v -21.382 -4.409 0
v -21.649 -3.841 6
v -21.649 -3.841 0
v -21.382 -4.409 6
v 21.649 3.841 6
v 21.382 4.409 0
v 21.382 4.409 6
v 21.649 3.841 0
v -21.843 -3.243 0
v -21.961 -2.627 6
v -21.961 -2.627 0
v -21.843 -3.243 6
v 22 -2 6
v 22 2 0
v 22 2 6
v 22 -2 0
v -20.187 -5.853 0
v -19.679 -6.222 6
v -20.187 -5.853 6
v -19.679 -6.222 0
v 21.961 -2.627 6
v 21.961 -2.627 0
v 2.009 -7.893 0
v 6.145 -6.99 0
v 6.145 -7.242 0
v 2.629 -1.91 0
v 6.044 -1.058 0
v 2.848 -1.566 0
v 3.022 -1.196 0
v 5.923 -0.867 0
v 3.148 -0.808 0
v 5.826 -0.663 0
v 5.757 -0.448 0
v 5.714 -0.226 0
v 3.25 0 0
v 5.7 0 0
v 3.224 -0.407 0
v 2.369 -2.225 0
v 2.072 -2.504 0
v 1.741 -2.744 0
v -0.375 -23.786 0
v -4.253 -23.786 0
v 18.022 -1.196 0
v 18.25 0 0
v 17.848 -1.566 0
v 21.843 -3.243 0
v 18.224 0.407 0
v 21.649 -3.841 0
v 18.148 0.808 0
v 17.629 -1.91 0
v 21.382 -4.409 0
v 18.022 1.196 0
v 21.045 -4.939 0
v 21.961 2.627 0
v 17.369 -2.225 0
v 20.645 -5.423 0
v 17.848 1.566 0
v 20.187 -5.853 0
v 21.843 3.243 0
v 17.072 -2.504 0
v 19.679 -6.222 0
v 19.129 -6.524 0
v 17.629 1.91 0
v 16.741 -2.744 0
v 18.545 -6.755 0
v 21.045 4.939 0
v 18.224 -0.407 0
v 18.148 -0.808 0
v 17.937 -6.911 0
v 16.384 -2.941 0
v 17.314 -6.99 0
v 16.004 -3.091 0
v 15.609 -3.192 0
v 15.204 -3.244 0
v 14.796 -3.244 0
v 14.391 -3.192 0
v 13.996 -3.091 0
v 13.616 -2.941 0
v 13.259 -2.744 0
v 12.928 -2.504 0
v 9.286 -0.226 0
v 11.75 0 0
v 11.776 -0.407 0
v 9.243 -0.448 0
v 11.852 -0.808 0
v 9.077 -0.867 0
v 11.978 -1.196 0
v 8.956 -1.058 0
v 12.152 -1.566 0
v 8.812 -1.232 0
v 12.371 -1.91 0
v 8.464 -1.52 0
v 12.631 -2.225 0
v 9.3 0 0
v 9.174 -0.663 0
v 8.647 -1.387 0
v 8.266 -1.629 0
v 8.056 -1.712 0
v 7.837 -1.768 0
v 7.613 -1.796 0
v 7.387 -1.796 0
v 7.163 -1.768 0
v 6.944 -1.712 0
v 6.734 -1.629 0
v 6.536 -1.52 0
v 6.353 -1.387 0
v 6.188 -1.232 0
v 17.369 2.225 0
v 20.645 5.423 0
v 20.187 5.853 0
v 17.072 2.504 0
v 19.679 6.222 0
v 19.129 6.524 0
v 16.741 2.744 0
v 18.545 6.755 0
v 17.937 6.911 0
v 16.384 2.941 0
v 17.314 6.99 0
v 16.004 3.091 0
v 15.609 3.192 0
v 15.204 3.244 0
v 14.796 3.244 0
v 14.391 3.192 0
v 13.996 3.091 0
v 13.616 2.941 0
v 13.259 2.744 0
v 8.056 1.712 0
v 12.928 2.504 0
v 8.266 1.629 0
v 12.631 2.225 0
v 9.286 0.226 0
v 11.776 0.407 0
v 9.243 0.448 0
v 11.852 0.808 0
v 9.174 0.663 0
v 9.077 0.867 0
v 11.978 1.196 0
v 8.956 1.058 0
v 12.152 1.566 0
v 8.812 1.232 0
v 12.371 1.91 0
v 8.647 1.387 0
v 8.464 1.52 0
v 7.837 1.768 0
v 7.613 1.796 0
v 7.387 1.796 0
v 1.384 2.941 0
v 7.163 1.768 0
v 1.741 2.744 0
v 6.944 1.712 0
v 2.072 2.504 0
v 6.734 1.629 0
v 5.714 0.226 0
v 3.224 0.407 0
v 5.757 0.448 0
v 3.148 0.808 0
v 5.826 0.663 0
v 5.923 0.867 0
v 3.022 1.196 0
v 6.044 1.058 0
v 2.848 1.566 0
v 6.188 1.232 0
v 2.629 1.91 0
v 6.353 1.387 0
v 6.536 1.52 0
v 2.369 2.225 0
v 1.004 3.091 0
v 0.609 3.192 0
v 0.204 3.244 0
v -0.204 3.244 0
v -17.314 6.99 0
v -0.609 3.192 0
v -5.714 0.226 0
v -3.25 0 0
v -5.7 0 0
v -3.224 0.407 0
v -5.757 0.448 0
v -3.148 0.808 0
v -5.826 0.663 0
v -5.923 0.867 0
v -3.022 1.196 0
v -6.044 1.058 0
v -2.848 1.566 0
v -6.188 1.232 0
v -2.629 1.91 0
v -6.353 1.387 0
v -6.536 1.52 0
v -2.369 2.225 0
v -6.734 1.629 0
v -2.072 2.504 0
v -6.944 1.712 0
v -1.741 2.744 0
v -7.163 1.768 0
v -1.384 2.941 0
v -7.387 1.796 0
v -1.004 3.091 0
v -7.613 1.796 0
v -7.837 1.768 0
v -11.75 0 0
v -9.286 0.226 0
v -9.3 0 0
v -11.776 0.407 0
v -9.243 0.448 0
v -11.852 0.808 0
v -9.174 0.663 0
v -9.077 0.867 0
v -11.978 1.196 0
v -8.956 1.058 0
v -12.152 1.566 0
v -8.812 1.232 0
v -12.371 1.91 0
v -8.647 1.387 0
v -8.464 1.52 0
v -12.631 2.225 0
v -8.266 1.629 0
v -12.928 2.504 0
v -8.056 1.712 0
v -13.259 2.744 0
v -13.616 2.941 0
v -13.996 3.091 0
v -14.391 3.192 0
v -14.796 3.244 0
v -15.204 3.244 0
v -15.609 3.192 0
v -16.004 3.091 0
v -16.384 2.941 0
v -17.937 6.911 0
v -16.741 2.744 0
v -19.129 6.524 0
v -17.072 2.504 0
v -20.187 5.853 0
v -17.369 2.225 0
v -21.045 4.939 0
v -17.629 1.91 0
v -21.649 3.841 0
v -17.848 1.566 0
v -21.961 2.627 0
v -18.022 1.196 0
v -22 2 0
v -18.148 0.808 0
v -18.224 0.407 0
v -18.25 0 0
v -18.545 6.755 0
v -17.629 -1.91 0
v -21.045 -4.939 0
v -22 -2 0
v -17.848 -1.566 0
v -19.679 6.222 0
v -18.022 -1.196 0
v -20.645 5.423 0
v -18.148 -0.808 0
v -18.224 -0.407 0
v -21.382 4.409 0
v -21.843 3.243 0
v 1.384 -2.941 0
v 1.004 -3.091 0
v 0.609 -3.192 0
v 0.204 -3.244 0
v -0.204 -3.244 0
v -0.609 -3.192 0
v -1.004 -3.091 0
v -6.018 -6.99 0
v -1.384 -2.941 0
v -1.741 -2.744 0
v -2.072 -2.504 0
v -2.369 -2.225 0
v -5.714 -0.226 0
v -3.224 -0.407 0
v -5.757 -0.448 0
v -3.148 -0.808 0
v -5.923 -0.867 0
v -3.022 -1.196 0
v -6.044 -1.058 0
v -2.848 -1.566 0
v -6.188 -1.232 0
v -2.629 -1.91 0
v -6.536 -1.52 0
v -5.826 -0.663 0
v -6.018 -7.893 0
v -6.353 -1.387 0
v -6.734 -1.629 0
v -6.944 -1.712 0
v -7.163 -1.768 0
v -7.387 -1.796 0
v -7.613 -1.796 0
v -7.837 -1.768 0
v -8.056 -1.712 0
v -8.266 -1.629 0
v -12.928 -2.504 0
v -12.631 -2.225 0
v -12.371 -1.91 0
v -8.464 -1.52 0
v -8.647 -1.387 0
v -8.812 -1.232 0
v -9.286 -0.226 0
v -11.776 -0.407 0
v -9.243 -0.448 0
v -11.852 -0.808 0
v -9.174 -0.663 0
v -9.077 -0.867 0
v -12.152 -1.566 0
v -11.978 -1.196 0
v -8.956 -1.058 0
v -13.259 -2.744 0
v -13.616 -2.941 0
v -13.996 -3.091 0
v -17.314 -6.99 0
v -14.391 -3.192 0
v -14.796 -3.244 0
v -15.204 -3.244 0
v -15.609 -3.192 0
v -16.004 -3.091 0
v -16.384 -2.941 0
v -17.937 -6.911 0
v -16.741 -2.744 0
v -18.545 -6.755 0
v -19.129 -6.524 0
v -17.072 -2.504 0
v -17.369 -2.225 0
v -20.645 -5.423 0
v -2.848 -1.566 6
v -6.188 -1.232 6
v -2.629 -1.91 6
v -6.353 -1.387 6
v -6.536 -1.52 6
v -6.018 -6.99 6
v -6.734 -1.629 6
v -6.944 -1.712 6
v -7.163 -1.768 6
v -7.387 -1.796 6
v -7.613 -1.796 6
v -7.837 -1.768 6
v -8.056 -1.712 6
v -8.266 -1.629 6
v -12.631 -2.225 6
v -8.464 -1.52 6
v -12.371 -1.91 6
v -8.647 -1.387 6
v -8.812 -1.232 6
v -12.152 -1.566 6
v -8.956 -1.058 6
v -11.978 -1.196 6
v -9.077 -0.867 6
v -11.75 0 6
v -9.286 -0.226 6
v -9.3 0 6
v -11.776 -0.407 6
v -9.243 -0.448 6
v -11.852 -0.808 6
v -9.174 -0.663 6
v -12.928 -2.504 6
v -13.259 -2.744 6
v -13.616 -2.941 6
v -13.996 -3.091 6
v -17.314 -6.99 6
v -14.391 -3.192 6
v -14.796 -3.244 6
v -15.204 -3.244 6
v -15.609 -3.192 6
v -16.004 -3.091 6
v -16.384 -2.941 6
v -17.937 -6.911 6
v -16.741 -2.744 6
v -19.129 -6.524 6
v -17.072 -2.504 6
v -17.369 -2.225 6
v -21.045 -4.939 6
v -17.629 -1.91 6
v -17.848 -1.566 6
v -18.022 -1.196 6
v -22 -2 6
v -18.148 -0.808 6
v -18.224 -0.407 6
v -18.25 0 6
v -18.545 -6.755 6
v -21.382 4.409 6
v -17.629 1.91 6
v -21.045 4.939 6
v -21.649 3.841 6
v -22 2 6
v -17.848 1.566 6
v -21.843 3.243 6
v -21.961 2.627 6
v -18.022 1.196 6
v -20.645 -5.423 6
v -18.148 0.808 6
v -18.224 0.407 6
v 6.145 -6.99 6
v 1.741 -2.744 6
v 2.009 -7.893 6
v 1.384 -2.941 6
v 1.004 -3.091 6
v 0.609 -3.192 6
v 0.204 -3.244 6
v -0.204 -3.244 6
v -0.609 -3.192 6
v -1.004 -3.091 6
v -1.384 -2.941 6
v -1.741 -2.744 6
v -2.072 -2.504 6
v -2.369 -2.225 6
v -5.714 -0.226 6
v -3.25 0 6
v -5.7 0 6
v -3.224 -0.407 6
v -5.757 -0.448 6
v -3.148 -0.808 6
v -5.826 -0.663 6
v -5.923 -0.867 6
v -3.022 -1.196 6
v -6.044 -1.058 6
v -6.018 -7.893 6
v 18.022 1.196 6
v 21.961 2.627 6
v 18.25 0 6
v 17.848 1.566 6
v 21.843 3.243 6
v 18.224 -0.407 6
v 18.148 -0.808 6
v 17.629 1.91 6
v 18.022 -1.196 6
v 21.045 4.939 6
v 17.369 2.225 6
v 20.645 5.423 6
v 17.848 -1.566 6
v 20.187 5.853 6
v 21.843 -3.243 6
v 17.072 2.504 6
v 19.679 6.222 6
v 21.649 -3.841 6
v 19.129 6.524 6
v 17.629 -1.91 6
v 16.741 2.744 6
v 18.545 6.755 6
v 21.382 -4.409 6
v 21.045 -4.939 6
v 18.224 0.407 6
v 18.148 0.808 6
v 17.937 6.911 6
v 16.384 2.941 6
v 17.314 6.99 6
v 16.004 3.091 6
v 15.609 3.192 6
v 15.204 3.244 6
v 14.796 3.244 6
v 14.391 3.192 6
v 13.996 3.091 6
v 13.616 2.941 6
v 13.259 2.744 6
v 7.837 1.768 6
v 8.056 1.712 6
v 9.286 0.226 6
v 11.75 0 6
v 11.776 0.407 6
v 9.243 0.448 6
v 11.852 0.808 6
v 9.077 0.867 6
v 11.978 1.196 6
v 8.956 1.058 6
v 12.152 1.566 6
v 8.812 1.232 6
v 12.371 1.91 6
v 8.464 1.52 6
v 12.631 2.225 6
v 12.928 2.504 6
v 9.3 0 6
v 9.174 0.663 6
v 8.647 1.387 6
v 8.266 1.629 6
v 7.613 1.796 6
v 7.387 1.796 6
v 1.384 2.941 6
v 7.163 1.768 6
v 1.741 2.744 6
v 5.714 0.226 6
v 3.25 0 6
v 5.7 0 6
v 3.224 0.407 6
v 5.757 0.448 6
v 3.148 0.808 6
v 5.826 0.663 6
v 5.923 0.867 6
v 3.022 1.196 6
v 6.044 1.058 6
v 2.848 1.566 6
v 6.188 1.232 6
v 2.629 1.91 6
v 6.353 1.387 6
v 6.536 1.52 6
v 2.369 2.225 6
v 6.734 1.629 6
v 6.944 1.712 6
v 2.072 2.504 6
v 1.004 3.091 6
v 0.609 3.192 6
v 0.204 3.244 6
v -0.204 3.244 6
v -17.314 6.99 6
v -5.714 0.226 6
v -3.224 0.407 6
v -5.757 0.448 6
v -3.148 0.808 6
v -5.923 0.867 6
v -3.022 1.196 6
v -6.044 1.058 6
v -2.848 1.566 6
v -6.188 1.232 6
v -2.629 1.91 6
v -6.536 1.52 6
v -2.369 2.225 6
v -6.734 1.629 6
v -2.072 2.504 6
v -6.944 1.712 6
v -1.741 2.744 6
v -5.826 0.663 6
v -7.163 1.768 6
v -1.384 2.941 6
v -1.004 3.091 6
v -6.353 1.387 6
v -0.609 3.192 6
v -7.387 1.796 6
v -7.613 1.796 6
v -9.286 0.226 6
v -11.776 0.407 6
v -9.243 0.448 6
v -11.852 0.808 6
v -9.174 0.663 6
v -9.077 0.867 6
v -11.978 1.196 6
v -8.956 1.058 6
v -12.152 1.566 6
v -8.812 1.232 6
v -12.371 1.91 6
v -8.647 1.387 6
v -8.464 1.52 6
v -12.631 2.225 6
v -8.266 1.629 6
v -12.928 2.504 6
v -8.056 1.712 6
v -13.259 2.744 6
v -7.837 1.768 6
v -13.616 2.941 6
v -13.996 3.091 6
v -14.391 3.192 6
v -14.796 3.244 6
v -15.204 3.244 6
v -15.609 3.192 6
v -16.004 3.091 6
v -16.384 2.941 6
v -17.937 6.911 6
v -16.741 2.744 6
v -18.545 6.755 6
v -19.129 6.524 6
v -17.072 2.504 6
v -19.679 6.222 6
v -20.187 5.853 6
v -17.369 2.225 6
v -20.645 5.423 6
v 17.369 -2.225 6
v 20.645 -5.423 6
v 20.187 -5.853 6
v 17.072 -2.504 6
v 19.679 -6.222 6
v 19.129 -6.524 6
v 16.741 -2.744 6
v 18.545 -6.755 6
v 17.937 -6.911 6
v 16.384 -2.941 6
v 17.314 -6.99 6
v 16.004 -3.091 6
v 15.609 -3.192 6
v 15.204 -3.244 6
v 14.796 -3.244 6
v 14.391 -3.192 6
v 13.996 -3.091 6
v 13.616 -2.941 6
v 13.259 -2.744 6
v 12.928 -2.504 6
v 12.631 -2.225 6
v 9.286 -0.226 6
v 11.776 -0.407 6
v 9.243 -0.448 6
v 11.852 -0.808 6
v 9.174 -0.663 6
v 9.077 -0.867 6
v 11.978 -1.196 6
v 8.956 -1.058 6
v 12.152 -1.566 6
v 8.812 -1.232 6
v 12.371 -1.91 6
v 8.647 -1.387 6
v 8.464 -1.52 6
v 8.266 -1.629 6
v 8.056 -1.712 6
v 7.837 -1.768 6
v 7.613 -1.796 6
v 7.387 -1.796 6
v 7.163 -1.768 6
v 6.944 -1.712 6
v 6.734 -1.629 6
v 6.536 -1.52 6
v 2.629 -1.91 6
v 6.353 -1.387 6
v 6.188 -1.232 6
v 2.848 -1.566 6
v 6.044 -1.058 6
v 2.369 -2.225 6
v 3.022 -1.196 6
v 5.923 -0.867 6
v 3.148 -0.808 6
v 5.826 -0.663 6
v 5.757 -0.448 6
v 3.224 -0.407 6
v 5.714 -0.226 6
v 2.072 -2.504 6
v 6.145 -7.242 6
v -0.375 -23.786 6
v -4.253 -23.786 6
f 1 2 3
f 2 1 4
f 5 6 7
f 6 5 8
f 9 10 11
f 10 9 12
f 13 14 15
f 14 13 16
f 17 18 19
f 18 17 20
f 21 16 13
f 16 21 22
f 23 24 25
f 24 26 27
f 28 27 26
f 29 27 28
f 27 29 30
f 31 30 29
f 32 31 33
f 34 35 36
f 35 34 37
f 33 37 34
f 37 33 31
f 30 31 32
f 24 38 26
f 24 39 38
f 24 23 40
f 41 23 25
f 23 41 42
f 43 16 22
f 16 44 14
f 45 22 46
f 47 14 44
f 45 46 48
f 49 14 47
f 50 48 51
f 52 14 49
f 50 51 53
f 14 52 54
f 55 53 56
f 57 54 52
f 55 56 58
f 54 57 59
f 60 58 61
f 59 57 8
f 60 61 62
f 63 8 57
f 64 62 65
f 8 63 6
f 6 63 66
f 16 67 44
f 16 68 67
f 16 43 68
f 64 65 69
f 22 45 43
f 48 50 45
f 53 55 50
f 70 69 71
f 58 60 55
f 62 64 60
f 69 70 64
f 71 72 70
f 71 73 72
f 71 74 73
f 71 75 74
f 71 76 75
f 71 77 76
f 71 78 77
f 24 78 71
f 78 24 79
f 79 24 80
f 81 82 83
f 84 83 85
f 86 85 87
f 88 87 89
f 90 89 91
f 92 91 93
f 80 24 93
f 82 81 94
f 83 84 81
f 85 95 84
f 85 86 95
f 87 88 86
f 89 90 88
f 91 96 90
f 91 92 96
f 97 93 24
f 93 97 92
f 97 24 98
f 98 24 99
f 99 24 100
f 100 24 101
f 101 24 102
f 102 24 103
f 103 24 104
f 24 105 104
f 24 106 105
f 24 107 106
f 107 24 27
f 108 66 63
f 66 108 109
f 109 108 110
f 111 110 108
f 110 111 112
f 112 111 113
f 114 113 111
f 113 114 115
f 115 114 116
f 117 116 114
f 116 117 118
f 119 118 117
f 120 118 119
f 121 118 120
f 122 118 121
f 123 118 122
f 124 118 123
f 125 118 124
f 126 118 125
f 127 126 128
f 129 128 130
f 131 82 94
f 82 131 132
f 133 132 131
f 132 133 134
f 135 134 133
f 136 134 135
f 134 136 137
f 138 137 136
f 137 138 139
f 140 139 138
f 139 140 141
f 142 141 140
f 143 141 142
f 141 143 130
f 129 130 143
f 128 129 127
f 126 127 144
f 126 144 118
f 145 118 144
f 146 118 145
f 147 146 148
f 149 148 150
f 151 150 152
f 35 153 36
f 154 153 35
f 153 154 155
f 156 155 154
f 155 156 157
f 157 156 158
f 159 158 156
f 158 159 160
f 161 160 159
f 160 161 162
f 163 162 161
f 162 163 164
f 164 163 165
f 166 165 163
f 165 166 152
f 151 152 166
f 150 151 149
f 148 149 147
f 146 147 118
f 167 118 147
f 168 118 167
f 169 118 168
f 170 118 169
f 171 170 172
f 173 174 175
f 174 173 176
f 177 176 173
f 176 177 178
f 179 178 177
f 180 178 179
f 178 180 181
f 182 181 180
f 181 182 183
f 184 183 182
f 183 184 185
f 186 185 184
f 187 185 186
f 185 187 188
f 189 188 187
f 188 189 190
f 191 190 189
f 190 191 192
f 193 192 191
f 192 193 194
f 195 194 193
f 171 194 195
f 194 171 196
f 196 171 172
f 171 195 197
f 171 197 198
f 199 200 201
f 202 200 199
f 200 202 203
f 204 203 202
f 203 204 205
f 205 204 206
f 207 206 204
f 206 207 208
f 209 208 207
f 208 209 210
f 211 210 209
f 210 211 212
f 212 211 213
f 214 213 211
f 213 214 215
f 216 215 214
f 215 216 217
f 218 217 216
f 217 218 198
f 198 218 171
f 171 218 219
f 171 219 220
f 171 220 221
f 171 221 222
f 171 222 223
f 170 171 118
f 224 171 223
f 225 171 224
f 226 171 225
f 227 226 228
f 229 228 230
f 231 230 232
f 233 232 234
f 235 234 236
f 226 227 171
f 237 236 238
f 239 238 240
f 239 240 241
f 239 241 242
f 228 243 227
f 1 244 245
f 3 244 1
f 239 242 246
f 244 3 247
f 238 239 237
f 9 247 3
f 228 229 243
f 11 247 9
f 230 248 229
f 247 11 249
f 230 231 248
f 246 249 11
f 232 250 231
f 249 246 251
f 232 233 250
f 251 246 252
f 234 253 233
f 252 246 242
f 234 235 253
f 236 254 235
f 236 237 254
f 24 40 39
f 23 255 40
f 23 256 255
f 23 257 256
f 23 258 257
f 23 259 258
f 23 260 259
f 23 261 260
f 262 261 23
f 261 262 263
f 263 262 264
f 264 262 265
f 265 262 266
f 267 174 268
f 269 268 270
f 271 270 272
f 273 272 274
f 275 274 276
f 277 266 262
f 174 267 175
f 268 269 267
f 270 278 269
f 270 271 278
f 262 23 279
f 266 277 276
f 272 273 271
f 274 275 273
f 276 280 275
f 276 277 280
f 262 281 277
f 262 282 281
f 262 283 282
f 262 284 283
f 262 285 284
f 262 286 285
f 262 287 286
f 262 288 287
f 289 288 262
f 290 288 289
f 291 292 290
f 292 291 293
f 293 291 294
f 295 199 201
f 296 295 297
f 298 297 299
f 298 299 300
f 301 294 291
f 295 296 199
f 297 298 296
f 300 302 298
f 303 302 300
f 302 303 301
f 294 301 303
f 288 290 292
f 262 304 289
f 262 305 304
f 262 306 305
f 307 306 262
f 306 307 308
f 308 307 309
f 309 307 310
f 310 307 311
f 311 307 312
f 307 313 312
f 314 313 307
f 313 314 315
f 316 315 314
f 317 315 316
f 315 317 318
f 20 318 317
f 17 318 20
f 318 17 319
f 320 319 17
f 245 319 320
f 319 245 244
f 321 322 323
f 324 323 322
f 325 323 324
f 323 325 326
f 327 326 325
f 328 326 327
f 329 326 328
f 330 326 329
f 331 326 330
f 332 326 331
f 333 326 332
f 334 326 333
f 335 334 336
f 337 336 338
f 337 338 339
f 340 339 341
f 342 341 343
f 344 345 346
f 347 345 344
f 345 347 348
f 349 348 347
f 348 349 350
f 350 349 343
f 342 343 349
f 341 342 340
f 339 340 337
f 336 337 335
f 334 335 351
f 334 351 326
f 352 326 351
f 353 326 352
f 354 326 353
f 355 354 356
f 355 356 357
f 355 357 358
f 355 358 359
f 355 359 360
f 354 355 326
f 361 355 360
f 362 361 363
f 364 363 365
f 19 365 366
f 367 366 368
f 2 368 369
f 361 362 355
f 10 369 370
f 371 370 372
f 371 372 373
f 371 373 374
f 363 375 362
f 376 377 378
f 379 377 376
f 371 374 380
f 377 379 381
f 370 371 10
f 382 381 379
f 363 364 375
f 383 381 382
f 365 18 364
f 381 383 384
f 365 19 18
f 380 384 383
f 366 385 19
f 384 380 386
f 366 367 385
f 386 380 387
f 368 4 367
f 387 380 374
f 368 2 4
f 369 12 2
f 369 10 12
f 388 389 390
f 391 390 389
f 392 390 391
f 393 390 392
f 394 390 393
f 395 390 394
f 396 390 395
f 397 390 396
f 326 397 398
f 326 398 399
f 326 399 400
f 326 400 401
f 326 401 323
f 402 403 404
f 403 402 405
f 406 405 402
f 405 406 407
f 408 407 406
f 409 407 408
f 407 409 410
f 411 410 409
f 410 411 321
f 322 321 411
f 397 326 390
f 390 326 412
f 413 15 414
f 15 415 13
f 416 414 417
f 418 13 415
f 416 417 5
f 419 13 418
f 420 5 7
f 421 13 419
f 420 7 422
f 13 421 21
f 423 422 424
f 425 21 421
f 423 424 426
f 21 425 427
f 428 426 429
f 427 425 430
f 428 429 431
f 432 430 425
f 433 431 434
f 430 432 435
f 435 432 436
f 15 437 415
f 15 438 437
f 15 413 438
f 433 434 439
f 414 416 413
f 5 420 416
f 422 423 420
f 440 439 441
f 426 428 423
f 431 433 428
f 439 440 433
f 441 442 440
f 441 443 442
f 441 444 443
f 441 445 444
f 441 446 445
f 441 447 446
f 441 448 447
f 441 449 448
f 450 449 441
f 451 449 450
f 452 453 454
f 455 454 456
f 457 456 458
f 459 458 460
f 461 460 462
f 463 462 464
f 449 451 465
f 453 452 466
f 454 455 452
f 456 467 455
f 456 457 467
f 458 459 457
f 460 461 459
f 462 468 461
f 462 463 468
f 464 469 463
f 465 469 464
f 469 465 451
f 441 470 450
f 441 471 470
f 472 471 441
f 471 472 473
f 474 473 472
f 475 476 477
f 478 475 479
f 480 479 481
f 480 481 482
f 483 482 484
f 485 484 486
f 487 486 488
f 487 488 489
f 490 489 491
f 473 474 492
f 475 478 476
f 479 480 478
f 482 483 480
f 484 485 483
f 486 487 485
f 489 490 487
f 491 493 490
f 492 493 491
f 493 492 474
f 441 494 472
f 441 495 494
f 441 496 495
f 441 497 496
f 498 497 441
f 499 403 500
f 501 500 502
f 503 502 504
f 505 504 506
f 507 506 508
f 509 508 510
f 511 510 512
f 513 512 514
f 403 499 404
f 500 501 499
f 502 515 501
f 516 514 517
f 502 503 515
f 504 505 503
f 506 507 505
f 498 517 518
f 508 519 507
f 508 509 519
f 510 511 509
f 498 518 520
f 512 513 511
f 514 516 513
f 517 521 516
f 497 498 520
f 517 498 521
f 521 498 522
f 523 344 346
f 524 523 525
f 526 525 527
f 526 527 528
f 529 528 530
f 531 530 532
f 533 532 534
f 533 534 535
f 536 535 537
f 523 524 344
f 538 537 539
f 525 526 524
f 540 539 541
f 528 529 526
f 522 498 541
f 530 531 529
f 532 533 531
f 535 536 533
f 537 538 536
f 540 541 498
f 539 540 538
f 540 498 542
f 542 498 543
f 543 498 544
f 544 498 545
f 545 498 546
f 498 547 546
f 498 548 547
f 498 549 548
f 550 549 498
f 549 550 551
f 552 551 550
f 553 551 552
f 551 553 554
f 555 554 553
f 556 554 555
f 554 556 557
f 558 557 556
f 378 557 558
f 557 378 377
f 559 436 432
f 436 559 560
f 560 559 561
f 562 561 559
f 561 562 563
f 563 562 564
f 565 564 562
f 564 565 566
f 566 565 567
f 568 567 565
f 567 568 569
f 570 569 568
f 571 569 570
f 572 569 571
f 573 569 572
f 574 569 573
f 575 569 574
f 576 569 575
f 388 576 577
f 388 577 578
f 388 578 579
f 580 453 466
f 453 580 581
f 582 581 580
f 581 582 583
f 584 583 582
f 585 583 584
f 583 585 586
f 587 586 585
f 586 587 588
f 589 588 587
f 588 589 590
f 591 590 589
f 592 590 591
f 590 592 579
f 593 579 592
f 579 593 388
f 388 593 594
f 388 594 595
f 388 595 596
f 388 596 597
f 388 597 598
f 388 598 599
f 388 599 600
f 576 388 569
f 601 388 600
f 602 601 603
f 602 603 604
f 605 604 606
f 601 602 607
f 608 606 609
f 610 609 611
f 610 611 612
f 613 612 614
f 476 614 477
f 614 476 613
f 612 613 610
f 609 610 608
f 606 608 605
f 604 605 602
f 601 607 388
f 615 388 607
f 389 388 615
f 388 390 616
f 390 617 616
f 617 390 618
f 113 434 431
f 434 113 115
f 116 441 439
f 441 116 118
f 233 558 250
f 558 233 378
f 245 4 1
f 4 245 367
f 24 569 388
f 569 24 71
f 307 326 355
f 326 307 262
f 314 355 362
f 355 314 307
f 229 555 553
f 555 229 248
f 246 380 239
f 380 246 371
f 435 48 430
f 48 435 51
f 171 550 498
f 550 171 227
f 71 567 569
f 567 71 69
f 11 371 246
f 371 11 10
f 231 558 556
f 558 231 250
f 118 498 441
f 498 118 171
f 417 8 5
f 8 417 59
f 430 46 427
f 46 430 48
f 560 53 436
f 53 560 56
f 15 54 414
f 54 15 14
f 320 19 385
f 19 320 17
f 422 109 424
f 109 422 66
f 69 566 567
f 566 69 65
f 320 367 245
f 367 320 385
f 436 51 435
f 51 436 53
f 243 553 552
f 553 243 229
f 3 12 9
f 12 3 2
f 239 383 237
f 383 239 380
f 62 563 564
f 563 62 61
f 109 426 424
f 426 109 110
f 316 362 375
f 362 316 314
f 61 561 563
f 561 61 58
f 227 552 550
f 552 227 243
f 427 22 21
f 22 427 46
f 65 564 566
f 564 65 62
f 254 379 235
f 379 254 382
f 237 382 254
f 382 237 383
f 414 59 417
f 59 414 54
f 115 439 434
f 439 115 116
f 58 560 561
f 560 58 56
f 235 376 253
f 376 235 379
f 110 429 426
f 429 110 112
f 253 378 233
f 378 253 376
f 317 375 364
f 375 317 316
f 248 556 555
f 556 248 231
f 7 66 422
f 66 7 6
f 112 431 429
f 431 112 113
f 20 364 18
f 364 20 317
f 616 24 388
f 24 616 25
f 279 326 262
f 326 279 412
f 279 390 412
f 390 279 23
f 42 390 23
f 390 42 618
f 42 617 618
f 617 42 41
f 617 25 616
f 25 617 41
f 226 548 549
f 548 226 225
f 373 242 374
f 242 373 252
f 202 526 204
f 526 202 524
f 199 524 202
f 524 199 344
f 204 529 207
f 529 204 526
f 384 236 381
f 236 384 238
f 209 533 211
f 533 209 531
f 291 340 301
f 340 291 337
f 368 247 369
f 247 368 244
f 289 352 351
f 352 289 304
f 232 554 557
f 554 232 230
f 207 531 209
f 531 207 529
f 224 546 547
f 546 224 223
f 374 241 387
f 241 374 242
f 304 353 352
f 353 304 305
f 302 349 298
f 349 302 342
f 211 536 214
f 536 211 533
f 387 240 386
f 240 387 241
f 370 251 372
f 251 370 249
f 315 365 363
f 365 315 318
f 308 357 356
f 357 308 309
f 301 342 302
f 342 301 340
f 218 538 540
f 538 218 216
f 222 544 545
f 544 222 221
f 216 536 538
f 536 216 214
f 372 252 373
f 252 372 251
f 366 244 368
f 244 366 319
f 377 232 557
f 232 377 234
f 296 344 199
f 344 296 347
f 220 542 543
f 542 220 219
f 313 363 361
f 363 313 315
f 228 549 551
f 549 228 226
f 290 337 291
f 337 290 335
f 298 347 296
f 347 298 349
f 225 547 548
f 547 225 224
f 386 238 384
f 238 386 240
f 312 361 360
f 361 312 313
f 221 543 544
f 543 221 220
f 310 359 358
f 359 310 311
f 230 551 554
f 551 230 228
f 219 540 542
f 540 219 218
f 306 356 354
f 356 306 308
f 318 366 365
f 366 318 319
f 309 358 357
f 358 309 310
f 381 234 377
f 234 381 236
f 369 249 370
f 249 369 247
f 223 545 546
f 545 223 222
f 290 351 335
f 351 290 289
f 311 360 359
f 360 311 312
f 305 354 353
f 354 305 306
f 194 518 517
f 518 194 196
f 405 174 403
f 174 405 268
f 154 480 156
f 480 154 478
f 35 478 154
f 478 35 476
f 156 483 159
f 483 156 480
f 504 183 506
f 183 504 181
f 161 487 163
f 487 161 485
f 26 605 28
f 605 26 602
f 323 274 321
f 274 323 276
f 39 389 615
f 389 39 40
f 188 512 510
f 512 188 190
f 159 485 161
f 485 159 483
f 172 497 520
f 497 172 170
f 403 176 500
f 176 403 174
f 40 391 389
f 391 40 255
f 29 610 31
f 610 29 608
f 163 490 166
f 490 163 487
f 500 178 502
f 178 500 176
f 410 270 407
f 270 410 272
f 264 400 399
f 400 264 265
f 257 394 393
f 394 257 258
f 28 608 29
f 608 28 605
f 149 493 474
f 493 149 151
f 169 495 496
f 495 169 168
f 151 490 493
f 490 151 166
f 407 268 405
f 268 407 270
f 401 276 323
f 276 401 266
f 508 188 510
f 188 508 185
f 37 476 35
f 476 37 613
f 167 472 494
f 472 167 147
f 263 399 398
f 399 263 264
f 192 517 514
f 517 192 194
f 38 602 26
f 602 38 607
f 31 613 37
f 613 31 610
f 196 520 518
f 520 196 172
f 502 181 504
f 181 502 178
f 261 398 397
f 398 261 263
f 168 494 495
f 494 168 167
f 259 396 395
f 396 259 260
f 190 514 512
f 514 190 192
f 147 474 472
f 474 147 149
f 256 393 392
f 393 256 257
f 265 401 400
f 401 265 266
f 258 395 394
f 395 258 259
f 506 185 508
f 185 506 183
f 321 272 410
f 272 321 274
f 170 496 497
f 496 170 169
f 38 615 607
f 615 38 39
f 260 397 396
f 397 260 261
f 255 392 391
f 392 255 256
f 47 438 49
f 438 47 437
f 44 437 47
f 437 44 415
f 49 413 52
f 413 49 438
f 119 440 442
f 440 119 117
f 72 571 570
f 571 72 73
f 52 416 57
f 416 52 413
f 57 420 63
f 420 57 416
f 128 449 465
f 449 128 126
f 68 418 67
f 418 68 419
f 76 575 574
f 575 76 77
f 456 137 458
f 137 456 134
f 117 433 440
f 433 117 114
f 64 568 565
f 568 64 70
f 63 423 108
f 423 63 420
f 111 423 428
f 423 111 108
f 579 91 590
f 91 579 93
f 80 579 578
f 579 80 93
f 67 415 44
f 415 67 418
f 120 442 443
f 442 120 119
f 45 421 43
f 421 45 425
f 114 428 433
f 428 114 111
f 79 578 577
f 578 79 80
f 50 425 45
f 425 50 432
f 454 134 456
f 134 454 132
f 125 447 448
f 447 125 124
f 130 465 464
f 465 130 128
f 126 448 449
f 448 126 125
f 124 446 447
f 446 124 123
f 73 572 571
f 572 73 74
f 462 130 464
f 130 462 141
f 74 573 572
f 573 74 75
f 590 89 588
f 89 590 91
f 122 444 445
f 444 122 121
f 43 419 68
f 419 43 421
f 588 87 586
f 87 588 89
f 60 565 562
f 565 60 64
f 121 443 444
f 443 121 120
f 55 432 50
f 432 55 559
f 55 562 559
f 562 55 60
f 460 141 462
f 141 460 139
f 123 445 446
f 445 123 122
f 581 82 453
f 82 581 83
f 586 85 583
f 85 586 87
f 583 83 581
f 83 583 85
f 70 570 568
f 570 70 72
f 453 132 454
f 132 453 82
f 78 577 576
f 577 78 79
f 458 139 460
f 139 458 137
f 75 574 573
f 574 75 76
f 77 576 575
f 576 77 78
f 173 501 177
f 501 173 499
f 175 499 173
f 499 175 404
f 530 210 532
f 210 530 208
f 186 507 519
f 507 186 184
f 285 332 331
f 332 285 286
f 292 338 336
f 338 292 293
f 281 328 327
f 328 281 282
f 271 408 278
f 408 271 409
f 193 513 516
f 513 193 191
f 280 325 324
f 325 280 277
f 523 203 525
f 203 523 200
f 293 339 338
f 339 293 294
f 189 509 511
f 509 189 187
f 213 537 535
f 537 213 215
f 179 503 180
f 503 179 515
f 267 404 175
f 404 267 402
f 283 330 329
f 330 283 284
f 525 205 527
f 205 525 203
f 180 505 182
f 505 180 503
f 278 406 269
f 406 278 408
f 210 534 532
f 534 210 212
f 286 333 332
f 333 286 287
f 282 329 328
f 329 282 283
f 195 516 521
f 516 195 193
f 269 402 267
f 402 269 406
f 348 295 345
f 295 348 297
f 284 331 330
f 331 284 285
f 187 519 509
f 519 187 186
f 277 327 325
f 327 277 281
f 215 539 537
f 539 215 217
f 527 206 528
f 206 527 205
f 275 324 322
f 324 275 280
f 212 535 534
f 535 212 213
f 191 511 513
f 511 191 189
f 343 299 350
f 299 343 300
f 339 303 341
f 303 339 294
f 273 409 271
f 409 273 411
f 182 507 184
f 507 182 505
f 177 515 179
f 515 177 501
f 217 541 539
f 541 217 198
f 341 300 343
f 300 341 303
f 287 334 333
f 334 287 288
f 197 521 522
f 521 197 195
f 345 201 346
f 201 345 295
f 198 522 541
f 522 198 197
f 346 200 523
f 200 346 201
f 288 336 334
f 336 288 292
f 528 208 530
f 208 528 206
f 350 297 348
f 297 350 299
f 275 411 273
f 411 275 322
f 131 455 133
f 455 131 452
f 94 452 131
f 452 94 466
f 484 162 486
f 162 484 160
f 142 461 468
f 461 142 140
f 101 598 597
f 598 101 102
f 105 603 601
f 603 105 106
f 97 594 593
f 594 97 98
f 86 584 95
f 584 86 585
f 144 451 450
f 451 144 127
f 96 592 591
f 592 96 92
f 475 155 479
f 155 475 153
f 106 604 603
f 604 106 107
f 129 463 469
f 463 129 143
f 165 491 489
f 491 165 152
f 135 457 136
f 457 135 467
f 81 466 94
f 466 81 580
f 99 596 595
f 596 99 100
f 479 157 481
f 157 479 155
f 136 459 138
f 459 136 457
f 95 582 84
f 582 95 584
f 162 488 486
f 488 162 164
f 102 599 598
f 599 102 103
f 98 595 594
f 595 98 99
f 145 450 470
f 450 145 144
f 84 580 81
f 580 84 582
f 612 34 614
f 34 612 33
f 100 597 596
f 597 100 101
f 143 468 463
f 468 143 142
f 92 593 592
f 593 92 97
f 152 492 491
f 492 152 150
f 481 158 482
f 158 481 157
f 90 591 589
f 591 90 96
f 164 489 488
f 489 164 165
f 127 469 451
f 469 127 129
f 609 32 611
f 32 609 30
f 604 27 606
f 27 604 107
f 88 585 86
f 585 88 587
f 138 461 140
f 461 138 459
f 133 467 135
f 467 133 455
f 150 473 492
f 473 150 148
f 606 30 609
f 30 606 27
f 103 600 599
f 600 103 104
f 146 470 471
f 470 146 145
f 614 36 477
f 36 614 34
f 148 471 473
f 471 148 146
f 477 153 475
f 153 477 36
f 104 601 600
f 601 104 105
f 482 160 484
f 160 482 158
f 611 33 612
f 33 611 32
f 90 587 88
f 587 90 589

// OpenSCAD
$fn = 50;


difference() {
	union() {
		hull() {
			translate(v = [-17.0000000000, 2.0000000000, 0]) {
				cylinder(h = 6, r = 5);
			}
			translate(v = [17.0000000000, 2.0000000000, 0]) {
				cylinder(h = 6, r = 5);
			}
			translate(v = [-17.0000000000, -2.0000000000, 0]) {
				cylinder(h = 6, r = 5);
			}
			translate(v = [17.0000000000, -2.0000000000, 0]) {
				cylinder(h = 6, r = 5);
			}
		}
		translate(v = [0, -5, 0]) {
			linear_extrude(height = 6) {
				text(font = "DejaVu Sans Mono:style=Bold", halign = "center", size = 19.0000000000, text = "7", valign = "top");
			}
		}
	}
	union() {
		translate(v = [-15.0000000000, 0.0000000000, 0]) {
			translate(v = [0, 0, -100]) {
				cylinder(h = 200, r = 3.2500000000);
			}
		}
		translate(v = [0, 0, -100]) {
			cylinder(h = 200, r = 3.2500000000);
		}
		translate(v = [15.0000000000, 0.0000000000, 0]) {
			translate(v = [0, 0, -100]) {
				cylinder(h = 200, r = 3.2500000000);
			}
		}
		translate(v = [-15.0000000000, 0.0000000000, 0]) {
			translate(v = [0, 0, -100]) {
				cylinder(h = 200, r = 1.8000000000);
			}
		}
		translate(v = [-7.5000000000, 0.0000000000, 0]) {
			translate(v = [0, 0, -100]) {
				cylinder(h = 200, r = 1.8000000000);
			}
		}
		translate(v = [0, 0, -100]) {
			cylinder(h = 200, r = 1.8000000000);
		}
		translate(v = [7.5000000000, 0.0000000000, 0]) {
			translate(v = [0, 0, -100]) {
				cylinder(h = 200, r = 1.8000000000);
			}
		}
		translate(v = [15.0000000000, 0.0000000000, 0]) {
			translate(v = [0, 0, -100]) {
				cylinder(h = 200, r = 1.8000000000);
			}
		}
	}
}
